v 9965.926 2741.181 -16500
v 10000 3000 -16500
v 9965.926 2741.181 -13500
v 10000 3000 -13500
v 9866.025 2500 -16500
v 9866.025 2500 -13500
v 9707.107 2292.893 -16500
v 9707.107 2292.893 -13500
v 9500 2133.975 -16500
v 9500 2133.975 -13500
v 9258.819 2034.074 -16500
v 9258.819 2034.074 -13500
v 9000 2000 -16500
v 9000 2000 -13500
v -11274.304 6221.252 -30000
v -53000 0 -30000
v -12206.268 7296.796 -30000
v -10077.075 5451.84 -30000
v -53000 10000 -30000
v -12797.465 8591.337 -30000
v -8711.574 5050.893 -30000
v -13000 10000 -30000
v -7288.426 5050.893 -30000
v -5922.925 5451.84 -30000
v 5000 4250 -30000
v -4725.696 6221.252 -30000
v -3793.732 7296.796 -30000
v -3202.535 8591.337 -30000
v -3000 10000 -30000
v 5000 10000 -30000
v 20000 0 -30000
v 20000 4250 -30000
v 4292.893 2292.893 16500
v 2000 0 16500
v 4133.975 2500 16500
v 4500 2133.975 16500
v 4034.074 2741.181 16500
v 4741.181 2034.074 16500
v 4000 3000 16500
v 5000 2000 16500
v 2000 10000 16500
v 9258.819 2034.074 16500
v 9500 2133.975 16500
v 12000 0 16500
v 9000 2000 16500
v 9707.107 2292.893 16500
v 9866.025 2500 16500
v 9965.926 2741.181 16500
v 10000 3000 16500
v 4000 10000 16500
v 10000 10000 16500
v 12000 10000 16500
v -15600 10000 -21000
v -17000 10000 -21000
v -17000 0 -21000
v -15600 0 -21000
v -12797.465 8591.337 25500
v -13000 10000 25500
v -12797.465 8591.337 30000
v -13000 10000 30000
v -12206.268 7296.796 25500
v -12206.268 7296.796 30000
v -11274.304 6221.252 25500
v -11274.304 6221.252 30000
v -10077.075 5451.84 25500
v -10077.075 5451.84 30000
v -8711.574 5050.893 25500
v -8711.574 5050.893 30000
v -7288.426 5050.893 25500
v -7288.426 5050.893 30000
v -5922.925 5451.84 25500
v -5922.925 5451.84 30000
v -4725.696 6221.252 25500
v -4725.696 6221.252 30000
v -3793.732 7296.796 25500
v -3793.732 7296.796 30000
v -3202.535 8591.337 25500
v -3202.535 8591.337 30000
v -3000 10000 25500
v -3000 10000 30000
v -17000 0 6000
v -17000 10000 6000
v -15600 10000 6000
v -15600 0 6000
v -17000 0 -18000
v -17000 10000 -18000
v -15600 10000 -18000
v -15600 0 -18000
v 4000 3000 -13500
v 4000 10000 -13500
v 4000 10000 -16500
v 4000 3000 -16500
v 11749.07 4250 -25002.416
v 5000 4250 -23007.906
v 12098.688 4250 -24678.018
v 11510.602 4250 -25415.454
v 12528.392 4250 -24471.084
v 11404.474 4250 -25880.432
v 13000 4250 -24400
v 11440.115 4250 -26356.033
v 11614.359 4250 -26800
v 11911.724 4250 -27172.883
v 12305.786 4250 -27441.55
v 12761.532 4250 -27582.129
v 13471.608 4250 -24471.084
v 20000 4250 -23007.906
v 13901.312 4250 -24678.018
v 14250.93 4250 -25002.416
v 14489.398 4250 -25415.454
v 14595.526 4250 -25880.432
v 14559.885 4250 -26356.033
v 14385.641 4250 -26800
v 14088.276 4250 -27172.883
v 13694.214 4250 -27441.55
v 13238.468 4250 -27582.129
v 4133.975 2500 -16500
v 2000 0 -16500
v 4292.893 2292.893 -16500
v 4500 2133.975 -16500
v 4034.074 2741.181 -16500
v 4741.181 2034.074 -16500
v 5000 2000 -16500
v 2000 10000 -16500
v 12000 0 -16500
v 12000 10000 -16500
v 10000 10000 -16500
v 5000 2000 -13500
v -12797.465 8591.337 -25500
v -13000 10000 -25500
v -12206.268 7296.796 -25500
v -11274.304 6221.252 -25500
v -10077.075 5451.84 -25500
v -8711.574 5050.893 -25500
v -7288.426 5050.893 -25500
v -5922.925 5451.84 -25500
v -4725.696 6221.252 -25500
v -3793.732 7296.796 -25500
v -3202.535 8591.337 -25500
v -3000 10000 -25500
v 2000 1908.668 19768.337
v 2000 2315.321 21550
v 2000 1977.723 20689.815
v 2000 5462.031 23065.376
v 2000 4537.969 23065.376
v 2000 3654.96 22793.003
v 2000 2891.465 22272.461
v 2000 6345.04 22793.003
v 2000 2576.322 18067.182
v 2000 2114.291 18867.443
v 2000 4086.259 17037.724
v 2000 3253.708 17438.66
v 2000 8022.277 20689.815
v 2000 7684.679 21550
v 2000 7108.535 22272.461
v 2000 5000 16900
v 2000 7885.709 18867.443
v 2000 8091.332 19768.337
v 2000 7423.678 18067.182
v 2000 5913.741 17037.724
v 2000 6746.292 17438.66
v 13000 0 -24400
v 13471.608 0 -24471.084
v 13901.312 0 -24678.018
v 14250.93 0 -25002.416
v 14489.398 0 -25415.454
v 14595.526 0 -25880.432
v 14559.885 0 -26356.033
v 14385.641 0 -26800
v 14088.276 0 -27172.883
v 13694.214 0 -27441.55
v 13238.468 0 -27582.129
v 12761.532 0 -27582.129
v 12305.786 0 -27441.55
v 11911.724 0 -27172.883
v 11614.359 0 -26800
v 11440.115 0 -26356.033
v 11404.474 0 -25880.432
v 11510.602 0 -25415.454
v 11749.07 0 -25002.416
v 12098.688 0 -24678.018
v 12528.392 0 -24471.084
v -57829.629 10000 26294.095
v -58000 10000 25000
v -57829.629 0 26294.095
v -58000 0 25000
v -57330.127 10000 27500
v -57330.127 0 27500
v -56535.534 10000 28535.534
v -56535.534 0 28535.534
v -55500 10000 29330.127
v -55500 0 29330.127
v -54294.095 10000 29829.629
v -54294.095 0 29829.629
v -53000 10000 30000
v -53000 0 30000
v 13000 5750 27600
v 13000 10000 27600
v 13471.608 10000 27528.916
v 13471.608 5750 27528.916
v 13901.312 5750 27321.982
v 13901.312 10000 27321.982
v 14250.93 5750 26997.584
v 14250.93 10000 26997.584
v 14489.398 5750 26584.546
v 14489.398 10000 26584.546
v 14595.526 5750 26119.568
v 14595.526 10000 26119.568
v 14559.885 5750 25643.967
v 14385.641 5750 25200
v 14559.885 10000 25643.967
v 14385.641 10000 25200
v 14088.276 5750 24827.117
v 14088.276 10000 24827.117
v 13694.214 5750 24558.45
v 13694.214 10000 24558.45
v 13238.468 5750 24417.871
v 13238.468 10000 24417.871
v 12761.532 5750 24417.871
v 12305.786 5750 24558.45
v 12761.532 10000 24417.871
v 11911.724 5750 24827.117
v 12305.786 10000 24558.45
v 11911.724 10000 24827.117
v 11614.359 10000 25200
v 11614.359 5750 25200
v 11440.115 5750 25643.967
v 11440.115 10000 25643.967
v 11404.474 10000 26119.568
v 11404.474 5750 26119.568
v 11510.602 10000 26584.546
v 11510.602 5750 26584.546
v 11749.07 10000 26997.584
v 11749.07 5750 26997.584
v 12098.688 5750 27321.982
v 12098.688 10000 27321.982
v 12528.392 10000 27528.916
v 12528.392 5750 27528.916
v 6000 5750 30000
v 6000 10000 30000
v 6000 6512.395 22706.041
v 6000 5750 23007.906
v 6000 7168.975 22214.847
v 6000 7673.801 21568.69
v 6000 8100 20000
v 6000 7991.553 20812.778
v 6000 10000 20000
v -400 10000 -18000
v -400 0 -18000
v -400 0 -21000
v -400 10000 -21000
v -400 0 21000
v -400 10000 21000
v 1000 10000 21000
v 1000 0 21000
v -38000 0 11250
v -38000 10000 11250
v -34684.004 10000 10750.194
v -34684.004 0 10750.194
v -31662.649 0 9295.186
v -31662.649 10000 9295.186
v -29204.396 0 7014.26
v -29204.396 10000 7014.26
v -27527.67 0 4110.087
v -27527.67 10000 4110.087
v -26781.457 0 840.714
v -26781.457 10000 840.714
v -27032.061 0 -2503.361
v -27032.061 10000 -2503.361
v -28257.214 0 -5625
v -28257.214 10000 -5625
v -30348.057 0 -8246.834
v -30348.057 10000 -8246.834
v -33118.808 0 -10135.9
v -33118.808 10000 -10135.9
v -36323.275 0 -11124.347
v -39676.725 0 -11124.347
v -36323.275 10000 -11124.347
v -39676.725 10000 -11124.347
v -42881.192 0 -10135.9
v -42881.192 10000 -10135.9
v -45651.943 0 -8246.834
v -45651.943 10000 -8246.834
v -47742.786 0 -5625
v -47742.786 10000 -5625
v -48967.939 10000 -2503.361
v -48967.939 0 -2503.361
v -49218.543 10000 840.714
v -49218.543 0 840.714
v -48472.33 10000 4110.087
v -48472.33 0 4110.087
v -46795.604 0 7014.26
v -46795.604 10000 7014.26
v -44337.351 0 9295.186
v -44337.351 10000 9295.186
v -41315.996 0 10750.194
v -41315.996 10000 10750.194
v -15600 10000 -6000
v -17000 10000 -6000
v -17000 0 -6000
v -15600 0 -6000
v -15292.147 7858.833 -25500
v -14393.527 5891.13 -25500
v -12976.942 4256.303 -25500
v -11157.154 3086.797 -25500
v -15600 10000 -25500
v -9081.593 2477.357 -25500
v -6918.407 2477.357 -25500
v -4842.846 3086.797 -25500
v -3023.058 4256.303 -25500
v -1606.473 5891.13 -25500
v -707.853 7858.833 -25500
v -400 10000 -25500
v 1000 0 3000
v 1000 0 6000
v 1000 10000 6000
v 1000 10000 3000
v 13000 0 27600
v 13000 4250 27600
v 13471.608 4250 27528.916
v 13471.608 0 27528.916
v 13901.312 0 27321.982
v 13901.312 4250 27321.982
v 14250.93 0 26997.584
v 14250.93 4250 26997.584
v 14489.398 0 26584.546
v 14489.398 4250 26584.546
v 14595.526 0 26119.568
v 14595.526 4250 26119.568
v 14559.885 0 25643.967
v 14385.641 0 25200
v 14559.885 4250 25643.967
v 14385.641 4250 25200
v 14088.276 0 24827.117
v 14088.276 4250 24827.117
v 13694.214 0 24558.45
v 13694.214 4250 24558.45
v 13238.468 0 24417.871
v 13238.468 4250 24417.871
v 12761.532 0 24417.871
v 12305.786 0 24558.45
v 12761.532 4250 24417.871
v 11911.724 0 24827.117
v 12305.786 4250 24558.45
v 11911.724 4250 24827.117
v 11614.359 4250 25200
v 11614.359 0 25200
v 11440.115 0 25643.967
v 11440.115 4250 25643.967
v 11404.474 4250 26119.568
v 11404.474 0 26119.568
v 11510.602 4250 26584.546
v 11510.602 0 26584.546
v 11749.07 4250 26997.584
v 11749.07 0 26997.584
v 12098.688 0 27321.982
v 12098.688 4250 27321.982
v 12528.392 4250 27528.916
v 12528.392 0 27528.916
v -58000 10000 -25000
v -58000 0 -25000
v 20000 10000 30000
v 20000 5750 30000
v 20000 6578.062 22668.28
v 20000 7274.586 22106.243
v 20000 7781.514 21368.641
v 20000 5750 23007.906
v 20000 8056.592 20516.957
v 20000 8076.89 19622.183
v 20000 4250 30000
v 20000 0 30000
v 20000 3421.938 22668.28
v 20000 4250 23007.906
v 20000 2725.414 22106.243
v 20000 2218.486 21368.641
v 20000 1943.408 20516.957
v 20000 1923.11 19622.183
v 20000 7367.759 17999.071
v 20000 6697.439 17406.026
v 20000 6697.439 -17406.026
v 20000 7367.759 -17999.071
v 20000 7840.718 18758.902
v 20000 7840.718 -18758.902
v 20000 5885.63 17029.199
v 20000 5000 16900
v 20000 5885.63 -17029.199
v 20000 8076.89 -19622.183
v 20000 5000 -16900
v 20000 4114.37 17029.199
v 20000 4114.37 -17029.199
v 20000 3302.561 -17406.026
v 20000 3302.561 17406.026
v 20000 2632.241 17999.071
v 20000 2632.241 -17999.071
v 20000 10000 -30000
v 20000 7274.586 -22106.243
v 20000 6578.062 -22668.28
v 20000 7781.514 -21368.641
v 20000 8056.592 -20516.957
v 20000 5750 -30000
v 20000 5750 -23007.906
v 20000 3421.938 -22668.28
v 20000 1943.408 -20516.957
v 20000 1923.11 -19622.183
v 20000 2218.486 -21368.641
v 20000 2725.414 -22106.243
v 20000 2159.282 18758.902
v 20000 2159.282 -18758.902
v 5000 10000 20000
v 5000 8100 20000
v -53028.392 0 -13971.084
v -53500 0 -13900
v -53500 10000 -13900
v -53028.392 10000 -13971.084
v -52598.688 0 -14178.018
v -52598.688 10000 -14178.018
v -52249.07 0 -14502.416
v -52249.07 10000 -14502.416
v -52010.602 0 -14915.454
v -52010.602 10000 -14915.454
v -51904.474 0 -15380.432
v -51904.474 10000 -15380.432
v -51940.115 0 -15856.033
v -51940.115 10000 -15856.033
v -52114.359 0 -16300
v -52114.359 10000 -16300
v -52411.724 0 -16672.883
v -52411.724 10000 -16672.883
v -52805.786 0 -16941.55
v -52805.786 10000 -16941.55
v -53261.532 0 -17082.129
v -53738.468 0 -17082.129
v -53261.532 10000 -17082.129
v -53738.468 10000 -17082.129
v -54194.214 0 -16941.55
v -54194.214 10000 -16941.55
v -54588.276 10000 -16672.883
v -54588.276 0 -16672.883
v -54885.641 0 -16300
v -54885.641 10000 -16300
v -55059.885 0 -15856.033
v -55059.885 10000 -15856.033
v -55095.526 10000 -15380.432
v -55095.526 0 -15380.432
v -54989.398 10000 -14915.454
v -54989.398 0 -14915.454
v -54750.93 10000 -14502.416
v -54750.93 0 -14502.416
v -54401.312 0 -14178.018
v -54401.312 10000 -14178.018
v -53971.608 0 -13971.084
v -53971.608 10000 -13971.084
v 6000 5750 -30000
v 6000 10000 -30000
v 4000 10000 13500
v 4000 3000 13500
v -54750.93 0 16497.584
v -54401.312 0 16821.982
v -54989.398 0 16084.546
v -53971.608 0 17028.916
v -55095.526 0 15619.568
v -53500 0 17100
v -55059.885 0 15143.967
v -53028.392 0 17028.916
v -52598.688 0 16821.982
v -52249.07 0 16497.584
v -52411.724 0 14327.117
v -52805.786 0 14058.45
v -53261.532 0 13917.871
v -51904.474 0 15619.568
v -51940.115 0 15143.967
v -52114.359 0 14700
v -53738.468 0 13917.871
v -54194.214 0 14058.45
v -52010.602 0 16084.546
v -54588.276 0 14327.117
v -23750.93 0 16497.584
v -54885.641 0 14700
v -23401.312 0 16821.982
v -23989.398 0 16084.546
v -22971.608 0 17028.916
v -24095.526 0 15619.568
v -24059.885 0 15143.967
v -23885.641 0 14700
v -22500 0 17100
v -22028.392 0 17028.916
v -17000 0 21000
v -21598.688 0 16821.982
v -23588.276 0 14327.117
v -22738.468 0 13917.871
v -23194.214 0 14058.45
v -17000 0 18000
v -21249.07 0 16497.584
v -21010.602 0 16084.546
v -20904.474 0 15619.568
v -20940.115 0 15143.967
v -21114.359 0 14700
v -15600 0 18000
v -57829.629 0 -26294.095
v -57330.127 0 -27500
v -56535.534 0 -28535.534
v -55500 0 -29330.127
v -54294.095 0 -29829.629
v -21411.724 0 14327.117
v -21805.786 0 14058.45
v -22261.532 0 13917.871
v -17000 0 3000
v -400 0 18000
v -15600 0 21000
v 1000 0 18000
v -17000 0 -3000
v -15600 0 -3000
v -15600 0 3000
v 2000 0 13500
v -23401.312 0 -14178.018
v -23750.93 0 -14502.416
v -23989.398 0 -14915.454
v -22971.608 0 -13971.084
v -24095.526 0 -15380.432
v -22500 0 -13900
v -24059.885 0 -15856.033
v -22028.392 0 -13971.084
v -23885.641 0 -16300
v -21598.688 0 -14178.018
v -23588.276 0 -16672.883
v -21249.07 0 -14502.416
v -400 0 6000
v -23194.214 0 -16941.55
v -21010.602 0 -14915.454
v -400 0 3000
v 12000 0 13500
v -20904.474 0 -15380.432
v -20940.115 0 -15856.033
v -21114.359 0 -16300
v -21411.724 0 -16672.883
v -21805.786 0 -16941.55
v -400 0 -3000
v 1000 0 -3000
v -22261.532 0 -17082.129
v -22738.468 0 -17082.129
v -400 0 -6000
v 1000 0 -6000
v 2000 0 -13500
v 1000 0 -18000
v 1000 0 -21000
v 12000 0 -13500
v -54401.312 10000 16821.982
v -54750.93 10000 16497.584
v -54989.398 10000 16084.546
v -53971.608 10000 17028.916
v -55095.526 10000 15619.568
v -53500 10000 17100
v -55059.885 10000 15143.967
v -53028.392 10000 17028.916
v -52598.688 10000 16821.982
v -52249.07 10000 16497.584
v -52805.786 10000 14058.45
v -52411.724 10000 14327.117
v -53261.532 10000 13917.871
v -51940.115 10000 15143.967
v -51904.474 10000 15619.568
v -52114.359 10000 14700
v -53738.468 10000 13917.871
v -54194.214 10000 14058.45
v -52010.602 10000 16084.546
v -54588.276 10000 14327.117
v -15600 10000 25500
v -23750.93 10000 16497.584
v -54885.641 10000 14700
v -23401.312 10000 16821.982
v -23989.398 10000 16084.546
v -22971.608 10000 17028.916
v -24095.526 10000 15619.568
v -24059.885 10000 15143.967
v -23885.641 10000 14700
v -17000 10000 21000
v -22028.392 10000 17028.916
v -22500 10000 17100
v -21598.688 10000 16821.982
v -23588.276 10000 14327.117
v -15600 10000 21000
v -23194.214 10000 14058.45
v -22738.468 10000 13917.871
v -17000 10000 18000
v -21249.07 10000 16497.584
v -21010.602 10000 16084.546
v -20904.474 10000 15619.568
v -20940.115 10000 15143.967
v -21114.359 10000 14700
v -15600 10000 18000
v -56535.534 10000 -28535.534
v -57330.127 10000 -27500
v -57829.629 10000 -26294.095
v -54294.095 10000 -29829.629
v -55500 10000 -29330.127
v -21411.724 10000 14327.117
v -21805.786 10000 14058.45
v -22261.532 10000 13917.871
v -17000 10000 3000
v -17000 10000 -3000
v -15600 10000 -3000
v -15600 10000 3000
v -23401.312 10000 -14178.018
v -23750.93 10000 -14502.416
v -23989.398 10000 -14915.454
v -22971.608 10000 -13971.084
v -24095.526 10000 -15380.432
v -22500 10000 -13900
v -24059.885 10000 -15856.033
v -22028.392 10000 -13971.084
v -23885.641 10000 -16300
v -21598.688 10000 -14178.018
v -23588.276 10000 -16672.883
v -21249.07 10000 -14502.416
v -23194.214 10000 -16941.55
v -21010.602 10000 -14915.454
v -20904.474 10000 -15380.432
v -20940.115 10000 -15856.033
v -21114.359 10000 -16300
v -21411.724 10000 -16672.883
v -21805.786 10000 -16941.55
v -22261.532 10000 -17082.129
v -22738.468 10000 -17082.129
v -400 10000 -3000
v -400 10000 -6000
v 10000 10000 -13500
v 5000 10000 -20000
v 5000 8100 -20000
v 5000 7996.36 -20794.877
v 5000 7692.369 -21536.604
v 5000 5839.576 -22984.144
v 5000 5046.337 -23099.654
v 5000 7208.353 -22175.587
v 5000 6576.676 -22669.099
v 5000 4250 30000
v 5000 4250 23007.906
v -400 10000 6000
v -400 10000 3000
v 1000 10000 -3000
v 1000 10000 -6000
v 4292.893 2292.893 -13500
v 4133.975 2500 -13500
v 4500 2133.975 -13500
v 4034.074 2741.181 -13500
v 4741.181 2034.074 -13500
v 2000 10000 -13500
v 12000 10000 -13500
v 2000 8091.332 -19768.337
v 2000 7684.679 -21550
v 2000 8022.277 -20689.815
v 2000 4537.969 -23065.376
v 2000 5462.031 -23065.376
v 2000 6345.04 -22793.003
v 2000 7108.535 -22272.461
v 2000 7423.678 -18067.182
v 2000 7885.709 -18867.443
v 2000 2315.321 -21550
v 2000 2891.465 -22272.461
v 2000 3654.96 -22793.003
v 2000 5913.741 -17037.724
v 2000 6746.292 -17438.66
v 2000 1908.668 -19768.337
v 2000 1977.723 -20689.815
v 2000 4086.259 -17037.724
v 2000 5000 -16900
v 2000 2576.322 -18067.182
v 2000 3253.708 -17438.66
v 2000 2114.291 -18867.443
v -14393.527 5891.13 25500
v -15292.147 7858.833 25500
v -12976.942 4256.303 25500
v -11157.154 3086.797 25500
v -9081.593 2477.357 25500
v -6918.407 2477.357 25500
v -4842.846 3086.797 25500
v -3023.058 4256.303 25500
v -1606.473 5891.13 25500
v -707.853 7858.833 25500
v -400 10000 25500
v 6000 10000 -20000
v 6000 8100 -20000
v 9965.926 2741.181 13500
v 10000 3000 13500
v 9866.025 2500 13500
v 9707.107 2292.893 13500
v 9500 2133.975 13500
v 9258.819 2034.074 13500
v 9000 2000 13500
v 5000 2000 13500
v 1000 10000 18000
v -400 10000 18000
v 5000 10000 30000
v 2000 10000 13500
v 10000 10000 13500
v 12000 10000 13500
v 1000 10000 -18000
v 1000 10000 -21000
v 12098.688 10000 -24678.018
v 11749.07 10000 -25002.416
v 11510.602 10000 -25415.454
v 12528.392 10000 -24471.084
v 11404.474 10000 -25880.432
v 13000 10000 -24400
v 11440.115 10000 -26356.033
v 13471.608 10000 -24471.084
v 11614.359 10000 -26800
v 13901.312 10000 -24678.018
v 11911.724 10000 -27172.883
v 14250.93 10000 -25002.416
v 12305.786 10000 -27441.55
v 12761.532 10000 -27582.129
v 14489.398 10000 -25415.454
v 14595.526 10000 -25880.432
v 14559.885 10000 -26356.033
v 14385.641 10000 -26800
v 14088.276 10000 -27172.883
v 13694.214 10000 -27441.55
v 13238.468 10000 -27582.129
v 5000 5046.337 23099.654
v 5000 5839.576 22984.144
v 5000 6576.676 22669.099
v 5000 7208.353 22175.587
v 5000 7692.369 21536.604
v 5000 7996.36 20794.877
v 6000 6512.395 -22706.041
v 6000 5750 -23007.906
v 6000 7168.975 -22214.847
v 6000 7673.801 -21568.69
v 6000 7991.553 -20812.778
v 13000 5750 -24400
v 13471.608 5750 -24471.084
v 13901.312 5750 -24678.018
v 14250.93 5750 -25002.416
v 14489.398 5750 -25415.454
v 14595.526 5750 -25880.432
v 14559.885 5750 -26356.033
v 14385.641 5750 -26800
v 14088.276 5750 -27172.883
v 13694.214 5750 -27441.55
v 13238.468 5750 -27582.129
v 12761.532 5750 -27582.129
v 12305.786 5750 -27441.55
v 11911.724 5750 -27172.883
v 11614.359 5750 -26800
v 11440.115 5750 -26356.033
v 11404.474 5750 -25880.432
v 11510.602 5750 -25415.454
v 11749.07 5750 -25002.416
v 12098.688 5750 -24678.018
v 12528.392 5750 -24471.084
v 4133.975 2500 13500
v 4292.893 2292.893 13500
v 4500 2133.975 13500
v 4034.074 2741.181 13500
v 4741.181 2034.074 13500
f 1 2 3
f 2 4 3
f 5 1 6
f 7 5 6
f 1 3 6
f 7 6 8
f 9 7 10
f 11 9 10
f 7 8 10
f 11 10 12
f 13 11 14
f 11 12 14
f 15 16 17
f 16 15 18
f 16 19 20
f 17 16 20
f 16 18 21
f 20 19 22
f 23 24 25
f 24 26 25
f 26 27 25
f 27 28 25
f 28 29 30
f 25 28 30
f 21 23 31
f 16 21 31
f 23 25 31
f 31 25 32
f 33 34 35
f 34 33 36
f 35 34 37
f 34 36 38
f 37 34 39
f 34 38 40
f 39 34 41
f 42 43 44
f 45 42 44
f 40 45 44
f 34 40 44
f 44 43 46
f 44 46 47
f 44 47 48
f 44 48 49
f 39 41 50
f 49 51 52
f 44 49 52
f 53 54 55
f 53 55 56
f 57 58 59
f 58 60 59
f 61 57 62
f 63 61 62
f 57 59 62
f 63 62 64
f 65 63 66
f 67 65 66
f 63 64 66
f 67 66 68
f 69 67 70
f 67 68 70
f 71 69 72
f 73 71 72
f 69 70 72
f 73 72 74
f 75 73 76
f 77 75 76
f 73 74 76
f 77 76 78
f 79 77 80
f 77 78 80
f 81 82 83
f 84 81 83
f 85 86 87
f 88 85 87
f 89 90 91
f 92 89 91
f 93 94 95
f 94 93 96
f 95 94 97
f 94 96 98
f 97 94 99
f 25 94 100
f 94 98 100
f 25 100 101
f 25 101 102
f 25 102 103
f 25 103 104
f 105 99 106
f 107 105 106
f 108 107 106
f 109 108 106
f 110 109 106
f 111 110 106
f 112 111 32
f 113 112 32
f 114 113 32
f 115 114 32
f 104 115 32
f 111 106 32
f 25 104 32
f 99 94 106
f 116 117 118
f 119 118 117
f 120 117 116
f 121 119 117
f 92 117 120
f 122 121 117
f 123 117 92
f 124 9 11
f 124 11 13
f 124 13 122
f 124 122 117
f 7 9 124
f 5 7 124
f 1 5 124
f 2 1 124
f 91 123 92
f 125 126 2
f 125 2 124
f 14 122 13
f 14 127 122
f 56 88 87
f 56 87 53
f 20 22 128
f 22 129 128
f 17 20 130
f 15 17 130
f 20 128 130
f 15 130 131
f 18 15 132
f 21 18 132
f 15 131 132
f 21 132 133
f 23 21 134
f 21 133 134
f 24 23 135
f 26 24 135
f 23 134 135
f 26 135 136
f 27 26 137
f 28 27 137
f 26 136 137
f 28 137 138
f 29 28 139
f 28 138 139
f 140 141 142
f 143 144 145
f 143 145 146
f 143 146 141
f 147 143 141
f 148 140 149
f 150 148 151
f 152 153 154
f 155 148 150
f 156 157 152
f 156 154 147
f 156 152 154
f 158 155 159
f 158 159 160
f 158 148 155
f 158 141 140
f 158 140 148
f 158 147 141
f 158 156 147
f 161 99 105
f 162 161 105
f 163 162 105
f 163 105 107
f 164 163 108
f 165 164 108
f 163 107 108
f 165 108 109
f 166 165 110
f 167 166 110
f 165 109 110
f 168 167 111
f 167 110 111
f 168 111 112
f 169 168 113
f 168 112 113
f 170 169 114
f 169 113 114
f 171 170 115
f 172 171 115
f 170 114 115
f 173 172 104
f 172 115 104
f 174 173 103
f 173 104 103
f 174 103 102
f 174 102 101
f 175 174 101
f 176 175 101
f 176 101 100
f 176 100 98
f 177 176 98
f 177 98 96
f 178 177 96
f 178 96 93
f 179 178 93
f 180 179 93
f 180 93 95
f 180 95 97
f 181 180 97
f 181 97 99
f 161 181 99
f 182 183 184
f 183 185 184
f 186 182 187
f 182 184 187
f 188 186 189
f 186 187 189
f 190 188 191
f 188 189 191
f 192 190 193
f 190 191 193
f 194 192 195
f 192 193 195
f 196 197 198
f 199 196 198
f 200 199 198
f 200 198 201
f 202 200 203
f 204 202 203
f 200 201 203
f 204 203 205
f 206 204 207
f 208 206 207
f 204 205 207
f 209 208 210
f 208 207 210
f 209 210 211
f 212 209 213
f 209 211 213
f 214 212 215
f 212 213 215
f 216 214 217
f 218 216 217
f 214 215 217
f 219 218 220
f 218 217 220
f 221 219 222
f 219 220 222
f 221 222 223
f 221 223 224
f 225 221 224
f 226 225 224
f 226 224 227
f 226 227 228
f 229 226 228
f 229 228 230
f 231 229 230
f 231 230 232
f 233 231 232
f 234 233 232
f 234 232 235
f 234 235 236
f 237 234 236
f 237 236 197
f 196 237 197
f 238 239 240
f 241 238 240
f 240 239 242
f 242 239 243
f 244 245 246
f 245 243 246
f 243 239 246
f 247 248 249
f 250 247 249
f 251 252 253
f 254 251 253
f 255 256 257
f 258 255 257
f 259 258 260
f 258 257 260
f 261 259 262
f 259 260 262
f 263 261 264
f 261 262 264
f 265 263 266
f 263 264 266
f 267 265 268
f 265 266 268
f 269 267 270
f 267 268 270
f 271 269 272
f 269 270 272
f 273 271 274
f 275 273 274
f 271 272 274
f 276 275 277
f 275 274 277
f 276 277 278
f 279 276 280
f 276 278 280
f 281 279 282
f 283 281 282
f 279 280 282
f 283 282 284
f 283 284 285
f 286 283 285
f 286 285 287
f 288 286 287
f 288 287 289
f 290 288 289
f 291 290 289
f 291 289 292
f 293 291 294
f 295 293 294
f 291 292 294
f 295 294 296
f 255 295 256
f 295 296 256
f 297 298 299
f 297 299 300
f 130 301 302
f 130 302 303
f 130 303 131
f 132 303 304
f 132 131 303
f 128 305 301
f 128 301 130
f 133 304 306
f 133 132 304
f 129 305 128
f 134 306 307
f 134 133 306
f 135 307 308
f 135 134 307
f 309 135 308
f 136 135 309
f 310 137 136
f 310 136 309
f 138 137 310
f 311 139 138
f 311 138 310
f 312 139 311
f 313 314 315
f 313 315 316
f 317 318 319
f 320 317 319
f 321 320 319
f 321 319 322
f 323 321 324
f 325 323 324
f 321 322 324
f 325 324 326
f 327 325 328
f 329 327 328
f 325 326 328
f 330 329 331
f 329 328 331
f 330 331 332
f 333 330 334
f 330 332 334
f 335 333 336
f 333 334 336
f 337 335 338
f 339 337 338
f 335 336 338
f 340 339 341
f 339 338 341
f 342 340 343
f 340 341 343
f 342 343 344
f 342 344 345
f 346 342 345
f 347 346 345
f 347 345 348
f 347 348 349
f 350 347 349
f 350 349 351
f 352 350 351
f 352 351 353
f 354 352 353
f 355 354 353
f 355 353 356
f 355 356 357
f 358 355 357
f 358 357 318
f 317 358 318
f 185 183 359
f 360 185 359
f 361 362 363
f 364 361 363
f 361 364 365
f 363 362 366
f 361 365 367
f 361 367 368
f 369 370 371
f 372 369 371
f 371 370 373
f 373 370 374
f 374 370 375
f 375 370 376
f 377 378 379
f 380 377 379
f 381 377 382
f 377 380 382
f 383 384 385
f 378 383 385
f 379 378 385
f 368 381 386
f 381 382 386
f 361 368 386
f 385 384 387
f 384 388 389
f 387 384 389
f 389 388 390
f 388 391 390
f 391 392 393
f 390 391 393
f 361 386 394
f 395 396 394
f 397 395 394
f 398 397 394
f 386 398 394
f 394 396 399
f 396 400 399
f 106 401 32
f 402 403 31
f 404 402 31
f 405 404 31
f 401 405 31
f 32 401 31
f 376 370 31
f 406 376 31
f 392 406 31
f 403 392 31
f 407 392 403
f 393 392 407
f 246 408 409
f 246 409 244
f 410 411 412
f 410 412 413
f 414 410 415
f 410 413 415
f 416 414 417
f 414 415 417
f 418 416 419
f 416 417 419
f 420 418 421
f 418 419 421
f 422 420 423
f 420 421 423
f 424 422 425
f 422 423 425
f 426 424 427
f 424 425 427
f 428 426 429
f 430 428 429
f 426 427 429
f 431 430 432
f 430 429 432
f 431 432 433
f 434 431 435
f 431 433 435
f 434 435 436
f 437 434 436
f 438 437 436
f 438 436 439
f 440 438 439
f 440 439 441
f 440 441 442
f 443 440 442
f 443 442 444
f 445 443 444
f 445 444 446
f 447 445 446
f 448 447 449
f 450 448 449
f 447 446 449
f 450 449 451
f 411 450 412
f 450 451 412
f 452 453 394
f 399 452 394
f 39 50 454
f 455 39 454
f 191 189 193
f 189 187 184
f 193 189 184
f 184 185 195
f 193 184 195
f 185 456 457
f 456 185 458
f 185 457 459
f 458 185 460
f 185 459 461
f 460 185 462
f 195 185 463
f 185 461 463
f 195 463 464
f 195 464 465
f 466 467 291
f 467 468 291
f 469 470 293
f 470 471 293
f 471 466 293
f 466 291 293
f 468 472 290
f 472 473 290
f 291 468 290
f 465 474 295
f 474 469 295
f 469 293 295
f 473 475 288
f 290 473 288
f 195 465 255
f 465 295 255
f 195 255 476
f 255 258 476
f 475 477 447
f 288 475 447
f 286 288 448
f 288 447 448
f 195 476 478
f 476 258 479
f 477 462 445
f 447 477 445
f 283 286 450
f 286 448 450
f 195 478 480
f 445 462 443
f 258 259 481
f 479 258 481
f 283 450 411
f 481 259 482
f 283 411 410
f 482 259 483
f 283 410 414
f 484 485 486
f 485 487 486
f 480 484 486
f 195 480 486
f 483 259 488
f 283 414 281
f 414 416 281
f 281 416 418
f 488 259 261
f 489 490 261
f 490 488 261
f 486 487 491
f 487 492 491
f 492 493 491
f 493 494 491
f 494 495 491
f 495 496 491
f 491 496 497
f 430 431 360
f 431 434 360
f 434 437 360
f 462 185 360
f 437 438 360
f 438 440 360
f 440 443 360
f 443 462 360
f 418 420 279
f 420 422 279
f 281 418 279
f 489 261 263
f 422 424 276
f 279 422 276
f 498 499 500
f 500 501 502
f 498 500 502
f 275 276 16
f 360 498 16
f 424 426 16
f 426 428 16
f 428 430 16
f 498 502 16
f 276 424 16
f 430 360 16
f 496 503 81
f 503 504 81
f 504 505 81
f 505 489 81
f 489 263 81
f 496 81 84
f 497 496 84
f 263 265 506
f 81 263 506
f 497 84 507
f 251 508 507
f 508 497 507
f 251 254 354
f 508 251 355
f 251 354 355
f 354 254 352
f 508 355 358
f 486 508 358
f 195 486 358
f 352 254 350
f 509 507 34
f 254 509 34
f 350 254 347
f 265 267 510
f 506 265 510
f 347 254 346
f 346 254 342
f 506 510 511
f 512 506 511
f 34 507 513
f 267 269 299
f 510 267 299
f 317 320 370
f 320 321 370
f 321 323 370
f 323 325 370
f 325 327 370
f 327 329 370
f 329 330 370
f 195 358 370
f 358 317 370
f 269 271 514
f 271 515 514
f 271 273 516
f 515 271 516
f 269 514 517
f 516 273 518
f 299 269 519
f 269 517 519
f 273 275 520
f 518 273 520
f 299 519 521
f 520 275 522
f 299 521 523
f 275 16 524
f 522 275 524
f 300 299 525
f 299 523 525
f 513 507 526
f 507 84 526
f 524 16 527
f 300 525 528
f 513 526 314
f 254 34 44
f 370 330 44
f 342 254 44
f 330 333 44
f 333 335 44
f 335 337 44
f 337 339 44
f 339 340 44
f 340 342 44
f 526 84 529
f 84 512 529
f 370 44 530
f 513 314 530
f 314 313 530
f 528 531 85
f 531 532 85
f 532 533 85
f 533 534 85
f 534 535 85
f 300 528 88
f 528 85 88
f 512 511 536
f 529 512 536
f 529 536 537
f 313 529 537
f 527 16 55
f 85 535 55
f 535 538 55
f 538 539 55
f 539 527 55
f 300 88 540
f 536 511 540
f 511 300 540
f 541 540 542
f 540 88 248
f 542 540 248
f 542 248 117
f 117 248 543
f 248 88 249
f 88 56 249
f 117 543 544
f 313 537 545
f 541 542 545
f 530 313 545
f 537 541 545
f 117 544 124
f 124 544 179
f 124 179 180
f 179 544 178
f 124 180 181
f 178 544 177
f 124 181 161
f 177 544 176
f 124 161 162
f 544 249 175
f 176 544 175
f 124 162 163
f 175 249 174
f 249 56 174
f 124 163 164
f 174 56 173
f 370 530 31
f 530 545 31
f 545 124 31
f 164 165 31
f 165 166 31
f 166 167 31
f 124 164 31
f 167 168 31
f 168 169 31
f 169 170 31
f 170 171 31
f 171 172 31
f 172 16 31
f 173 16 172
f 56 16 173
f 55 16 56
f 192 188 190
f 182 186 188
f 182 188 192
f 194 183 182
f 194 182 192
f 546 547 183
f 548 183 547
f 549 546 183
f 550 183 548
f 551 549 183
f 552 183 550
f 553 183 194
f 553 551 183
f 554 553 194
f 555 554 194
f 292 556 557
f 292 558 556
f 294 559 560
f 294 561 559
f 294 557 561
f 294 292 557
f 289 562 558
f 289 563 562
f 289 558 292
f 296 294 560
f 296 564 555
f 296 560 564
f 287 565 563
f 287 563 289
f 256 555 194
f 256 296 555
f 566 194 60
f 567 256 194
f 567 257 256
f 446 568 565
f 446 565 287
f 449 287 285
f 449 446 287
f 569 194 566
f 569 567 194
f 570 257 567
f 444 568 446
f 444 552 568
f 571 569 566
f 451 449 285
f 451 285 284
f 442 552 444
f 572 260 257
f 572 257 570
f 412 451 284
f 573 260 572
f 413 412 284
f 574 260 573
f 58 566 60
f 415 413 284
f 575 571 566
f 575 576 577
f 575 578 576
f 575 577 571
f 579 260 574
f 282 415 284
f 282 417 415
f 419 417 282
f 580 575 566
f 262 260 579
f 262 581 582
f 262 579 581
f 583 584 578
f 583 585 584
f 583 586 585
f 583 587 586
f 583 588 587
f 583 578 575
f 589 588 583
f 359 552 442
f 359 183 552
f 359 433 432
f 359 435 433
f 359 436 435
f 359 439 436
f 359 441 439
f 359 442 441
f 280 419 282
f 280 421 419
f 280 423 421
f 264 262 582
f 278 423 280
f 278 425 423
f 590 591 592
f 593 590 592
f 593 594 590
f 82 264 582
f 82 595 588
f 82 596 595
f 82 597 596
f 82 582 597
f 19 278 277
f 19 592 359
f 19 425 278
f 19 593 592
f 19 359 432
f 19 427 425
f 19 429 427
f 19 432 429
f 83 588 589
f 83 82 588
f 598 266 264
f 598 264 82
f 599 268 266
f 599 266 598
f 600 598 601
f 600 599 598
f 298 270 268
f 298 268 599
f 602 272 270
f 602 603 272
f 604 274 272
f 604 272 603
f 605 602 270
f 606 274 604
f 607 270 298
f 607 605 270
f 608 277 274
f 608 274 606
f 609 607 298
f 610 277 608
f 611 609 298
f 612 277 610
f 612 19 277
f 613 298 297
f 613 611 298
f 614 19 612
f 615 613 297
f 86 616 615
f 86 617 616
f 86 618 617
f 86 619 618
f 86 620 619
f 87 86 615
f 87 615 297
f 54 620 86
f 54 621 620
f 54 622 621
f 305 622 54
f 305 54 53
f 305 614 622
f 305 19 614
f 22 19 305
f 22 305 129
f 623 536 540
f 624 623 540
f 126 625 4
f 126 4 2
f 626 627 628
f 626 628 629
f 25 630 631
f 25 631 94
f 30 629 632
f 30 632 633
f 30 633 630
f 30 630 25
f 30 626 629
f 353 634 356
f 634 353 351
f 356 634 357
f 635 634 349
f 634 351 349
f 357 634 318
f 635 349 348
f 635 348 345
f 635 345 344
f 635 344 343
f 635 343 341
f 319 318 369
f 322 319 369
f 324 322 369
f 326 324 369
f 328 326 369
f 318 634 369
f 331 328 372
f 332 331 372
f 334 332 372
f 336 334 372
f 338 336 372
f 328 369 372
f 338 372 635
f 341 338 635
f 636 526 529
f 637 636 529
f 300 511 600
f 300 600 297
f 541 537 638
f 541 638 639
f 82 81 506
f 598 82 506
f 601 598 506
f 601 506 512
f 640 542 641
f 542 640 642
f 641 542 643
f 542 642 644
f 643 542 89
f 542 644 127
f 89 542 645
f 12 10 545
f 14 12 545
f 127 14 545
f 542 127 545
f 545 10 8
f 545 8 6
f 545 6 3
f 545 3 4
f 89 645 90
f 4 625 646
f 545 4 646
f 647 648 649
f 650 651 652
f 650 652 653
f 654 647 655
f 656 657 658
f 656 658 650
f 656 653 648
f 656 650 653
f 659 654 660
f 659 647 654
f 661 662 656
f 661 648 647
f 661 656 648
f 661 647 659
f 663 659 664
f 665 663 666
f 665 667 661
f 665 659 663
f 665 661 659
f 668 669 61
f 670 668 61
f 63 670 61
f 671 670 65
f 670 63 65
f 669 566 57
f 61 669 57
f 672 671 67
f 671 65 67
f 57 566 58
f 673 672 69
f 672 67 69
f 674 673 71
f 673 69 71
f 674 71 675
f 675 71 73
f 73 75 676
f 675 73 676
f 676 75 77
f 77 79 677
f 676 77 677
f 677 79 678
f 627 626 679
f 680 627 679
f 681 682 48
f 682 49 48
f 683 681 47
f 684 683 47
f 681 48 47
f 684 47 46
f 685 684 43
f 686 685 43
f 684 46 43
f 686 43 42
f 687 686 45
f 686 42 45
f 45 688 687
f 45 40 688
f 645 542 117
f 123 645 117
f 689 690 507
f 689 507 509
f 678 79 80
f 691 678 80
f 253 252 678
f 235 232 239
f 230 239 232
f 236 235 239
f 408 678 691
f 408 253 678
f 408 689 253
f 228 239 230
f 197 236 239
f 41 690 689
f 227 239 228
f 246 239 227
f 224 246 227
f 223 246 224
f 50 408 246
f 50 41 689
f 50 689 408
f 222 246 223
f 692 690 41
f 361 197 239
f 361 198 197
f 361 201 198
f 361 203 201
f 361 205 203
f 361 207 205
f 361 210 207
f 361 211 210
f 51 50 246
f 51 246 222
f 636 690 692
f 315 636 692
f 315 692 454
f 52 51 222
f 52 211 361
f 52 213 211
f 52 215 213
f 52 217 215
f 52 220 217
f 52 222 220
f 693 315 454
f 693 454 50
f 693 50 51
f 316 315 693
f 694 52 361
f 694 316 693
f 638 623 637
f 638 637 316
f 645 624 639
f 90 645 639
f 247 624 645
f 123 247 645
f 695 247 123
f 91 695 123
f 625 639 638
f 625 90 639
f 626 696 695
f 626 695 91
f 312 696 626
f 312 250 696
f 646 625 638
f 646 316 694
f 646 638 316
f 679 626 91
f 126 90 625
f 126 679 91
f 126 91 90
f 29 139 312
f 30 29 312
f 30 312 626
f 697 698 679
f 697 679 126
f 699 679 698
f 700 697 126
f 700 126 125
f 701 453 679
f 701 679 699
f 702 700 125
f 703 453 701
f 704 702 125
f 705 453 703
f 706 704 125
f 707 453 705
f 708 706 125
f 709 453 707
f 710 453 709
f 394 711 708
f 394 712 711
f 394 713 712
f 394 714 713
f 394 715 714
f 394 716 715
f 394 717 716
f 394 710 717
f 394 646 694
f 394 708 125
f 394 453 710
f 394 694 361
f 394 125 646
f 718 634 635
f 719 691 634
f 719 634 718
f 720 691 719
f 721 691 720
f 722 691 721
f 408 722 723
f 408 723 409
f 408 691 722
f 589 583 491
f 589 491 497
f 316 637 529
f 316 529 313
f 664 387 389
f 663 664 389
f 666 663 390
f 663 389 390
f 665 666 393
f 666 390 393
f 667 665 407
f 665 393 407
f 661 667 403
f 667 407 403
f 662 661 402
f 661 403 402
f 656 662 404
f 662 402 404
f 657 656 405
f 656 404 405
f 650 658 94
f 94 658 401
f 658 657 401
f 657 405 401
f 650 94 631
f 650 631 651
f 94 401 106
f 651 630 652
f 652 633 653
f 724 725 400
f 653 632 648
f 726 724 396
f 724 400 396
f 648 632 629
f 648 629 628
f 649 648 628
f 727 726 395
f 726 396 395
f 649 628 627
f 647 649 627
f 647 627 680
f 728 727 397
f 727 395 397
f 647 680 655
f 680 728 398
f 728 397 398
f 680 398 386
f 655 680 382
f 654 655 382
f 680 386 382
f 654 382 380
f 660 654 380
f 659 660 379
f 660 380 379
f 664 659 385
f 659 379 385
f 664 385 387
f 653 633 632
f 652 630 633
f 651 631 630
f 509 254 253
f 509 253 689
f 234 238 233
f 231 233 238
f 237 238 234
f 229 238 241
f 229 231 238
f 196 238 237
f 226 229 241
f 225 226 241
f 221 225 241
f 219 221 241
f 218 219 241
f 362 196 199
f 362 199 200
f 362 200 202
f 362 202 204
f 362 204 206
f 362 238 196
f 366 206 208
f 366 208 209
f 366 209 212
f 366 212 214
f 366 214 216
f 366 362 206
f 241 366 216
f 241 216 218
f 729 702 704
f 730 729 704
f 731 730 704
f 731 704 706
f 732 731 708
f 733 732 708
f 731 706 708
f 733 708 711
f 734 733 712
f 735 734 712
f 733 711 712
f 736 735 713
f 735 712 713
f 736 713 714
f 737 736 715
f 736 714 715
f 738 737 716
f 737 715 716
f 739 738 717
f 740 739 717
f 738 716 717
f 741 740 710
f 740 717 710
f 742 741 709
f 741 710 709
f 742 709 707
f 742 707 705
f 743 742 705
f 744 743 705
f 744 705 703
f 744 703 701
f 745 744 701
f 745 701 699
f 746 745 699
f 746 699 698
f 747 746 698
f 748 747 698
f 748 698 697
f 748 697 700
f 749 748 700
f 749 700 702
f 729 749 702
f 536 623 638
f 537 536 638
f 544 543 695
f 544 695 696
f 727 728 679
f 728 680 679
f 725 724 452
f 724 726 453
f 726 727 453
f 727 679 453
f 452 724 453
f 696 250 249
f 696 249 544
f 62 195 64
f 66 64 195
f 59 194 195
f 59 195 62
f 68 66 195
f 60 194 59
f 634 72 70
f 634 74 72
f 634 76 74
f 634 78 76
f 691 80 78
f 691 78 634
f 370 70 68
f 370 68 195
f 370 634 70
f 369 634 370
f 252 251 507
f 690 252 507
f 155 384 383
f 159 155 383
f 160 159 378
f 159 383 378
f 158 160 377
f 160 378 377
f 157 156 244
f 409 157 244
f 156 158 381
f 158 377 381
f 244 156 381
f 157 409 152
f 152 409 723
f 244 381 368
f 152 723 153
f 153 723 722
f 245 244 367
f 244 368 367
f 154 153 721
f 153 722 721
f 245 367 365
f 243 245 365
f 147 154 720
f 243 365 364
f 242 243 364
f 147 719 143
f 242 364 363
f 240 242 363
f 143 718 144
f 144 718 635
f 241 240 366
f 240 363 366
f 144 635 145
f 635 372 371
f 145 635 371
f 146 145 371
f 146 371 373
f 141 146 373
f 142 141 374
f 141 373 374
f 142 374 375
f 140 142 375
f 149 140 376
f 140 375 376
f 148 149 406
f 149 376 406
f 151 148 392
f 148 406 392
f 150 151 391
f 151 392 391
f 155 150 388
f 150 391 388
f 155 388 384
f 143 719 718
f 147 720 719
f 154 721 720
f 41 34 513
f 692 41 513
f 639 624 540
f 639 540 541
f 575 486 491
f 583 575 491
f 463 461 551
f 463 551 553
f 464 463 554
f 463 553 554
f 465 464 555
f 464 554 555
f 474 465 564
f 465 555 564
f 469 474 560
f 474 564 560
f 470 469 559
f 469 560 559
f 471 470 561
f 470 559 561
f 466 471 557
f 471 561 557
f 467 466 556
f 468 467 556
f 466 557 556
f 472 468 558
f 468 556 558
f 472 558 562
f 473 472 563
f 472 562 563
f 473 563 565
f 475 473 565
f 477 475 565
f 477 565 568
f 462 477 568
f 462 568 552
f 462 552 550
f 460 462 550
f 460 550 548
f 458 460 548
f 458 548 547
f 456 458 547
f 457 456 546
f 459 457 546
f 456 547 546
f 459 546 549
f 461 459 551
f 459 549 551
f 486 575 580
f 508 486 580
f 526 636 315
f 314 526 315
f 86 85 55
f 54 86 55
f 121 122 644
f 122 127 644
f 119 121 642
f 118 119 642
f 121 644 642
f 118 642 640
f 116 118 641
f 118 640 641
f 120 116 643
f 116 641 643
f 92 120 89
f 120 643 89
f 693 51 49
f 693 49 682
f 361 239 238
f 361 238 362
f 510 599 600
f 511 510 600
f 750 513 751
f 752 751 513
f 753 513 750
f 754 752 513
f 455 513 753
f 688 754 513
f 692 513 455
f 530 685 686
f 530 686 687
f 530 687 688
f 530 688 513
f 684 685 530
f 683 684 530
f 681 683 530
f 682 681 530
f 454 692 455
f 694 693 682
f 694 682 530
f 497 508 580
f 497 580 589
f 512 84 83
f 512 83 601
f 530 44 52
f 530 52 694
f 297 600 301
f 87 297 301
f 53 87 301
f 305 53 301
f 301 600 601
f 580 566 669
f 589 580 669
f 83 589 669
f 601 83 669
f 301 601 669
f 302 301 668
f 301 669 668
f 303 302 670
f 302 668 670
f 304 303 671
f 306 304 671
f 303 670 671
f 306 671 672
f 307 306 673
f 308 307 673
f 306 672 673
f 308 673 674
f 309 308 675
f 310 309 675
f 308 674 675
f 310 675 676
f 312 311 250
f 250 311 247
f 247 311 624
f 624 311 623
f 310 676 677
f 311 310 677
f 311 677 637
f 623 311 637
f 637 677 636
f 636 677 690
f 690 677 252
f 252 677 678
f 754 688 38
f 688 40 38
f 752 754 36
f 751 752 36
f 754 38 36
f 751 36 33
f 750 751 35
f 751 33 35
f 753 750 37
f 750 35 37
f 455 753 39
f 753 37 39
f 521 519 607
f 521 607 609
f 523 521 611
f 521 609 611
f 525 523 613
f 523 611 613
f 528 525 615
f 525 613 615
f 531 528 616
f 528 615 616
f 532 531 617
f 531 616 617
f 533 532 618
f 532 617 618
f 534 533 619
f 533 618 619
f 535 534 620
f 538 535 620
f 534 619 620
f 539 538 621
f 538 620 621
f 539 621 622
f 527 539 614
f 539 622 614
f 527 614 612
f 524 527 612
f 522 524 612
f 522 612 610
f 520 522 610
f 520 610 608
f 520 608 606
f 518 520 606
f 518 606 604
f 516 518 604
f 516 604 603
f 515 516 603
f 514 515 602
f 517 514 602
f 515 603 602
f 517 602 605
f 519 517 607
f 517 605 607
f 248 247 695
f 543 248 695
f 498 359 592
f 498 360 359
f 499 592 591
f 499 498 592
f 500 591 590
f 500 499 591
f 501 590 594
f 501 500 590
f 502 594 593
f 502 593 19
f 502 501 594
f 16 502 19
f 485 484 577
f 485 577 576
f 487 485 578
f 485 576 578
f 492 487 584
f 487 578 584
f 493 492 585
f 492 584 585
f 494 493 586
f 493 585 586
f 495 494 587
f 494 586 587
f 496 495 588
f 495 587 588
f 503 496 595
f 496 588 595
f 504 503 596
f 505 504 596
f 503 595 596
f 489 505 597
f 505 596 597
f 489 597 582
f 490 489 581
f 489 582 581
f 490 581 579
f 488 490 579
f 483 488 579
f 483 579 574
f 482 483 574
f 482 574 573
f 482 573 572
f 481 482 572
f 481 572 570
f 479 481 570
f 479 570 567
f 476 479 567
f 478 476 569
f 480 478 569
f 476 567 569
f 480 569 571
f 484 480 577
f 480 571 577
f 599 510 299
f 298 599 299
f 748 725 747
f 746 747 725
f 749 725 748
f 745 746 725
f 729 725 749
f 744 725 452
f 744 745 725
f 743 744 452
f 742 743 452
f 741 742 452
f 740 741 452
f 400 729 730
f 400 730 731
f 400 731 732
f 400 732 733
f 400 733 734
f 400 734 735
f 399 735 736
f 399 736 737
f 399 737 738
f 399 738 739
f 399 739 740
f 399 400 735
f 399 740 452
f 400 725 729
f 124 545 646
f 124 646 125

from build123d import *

# Parameters (mm, degrees)
SKETCH_2_W           = 40000
SKETCH_2_H           = 60000
EXTRUDE_1_DEPTH      = 10000
SKETCH_4_R           = 7600
CUT_EXTRUDE_2_DEPTH  = 25500
SKETCH_5_R           = 5000
CUT_EXTRUDE_3_DEPTH  = 40000
SKETCH_6_W           = 2000
SKETCH_6_H           = 3000
CUT_EXTRUDE_4_DEPTH  = 80000
SKETCH_12_W          = 38000
SKETCH_12_H          = 60000
SKETCH_12_R          = 1600
SKETCH_12_R_2        = 11250
EXTRUDE_2_DEPTH      = 10000
SKETCH_13_R          = 3100
CUT_EXTRUDE_6_DEPTH  = 18000
SKETCH_16_W          = 10031.479605139
SKETCH_16_H          = 1500
CUT_EXTRUDE_7_DEPTH  = 15000
CUT_EXTRUDE_8_REACH  = 66062.578
SKETCH_17_W          = 1000
SKETCH_17_H          = 10000
SKETCH_18_R          = 1600
CUT_EXTRUDE_9_DEPTH  = 15000
SKETCH_19_W          = 1400
SKETCH_19_H          = 3000
CUT_EXTRUDE_10_DEPTH = 15000
FILLET_1_R           = 5000
SKETCH_20_W          = 6000
SKETCH_20_H          = 3000
CUT_EXTRUDE_11_DEPTH = 2000
FILLET_2_R           = 1000


with BuildPart() as part:
    # 草圖2 → 填料-伸長1 (new body)
    with BuildSketch(Plane(origin=(0, 0, 0), x_dir=(1, 0, 0), z_dir=(0, 1, 0))):
        Rectangle(SKETCH_2_W, SKETCH_2_H)
    extrude(amount=EXTRUDE_1_DEPTH)

    # 草圖4 → 除料-伸長2 (cut, symmetric)
    with BuildSketch(Plane.XY):
        with Locations((-8000, 10000)):
            Circle(SKETCH_4_R)
    extrude(amount=CUT_EXTRUDE_2_DEPTH, both=True, mode=Mode.SUBTRACT)

    # 草圖5 → 除料-伸長3 (cut, symmetric)
    with BuildSketch(Plane.XY):
        with Locations((-8000, 10000)):
            Circle(SKETCH_5_R)
    extrude(amount=CUT_EXTRUDE_3_DEPTH, both=True, mode=Mode.SUBTRACT)

    # 草圖6 → 除料-伸長4 (cut)
    with BuildSketch(Plane(origin=(0, 10000, 0), x_dir=(1, 0, 0), z_dir=(0, 1, 0))):
        with Locations((11000, -15000)):
            Rectangle(SKETCH_6_W, SKETCH_6_H)
        with Locations((3000, 15000)):
            Rectangle(SKETCH_6_W, SKETCH_6_H)
        with Locations((11000, 15000)):
            Rectangle(SKETCH_6_W, SKETCH_6_H)
        with Locations((3000, -15000)):
            Rectangle(SKETCH_6_W, SKETCH_6_H)
    extrude(amount=-CUT_EXTRUDE_4_DEPTH, mode=Mode.SUBTRACT)

    # 草圖12 → 填料-伸長2 (add)
    with BuildSketch(Plane(origin=(0, 10000, 0), x_dir=(1, 0, 0), z_dir=(0, 1, 0))):
        with Locations((-39000, 0)):
            Rectangle(SKETCH_12_W, SKETCH_12_H)
        with Locations(Location((-53500, 15500, 0), (0, 0, 270))):
            Circle(SKETCH_12_R, mode=Mode.SUBTRACT)
        with Locations(Location((-22500, 15500, 0), (0, 0, 270))):
            Circle(SKETCH_12_R, mode=Mode.SUBTRACT)
        with Locations(Location((-53500, -15500, 0), (0, 0, 270))):
            Circle(SKETCH_12_R, mode=Mode.SUBTRACT)
        with Locations(Location((-22500, -15500, 0), (0, 0, 270))):
            Circle(SKETCH_12_R, mode=Mode.SUBTRACT)
        with Locations(Location((-38000, 0, 0), (0, 0, 270))):
            Circle(SKETCH_12_R_2, mode=Mode.SUBTRACT)
    extrude(amount=-EXTRUDE_2_DEPTH)

    # 草圖13 → 除料-伸長6 (cut)
    with BuildSketch(Plane(origin=(20000, 0, 0), x_dir=(0, 0, -1), z_dir=(1, 0, 0))):
        with Locations((-20000, 5000)):
            Circle(SKETCH_13_R)
        with Locations(Location((20000, 5000, 0), (0, 0, 180))):
            Circle(SKETCH_13_R)
    extrude(amount=-CUT_EXTRUDE_6_DEPTH, mode=Mode.SUBTRACT)

    # 草圖16 → 除料-伸長7 (cut)
    with BuildSketch(Plane(origin=(20000, 0, 0), x_dir=(0, 0, -1), z_dir=(1, 0, 0))):
        with Locations((-26040.217814772, 5000)):
            Rectangle(SKETCH_16_W, SKETCH_16_H)
        with Locations((26040.217814772, 5000)):
            Rectangle(SKETCH_16_W, SKETCH_16_H)
    extrude(amount=-CUT_EXTRUDE_7_DEPTH, mode=Mode.SUBTRACT)

    # 除料-伸長8: up to this face of the body (flat: up to its plane)
    cut_extrude_8_end = Plane(part.part.faces().sort_by_distance((12500, 4250, -26503.95312427))[0])
    # 草圖17 → 除料-伸長8 (cut, up to the picked face)
    with BuildSketch(Plane(origin=(0, 10000, 0), x_dir=(1, 0, 0), z_dir=(0, 1, 0)), mode=Mode.PRIVATE) as cut_extrude_8_sk1:
        with Locations((5500, 25000)):
            Rectangle(SKETCH_17_W, SKETCH_17_H)
    cut_extrude_8_tool1 = split(extrude(cut_extrude_8_sk1.sketch, amount=-CUT_EXTRUDE_8_REACH, mode=Mode.PRIVATE), bisect_by=cut_extrude_8_end, keep=Keep.BOTH, mode=Mode.PRIVATE)
    # 草圖17 → 除料-伸長8 (cut, up to the picked face)
    with BuildSketch(Plane(origin=(0, 10000, 0), x_dir=(1, 0, 0), z_dir=(0, 1, 0)), mode=Mode.PRIVATE) as cut_extrude_8_sk2:
        with Locations((5500, -25000)):
            Rectangle(SKETCH_17_W, SKETCH_17_H)
    cut_extrude_8_tool2 = split(extrude(cut_extrude_8_sk2.sketch, amount=-CUT_EXTRUDE_8_REACH, mode=Mode.PRIVATE), bisect_by=cut_extrude_8_end, keep=Keep.BOTH, mode=Mode.PRIVATE)
    add(cut_extrude_8_tool1.solids().sort_by(Axis((5500, 10000, -25000), (0, -1, 0)))[0], mode=Mode.SUBTRACT)
    add(cut_extrude_8_tool2.solids().sort_by(Axis((5500, 10000, 25000), (0, -1, 0)))[0], mode=Mode.SUBTRACT)

    # 草圖18 → 除料-伸長9 (cut)
    with BuildSketch(Plane(origin=(0, 10000, 0), x_dir=(1, 0, 0), z_dir=(0, 1, 0))):
        with Locations(Location((13000, 26000, 0), (0, 0, 270))):
            Circle(SKETCH_18_R)
        with Locations(Location((13000, -26000, 0), (0, 0, 270))):
            Circle(SKETCH_18_R)
    extrude(amount=-CUT_EXTRUDE_9_DEPTH, mode=Mode.SUBTRACT)

    # 草圖19 → 除料-伸長10 (cut)
    with BuildSketch(Plane(origin=(0, 10000, 0), x_dir=(1, 0, 0), z_dir=(0, 1, 0))):
        with Locations((-16300, 19500)):
            Rectangle(SKETCH_19_W, SKETCH_19_H)
        with Locations((-16300, 4500)):
            Rectangle(SKETCH_19_W, SKETCH_19_H)
        with Locations((-16300, -4500)):
            Rectangle(SKETCH_19_W, SKETCH_19_H)
        with Locations((-16300, -19500)):
            Rectangle(SKETCH_19_W, SKETCH_19_H)
        with Locations((300, -19500)):
            Rectangle(SKETCH_19_W, SKETCH_19_H)
        with Locations((300, -4500)):
            Rectangle(SKETCH_19_W, SKETCH_19_H)
        with Locations((300, 4500)):
            Rectangle(SKETCH_19_W, SKETCH_19_H)
        with Locations((300, 19500)):
            Rectangle(SKETCH_19_W, SKETCH_19_H)
    extrude(amount=-CUT_EXTRUDE_10_DEPTH, mode=Mode.SUBTRACT)

    # 圓角1
    fillet_1_edges = [part.edges().sort_by_distance(p)[0] for p in [
        (-58000, 5000, 30000),
        (-58000, 5000, -30000),
    ]]
    fillet(fillet_1_edges, radius=FILLET_1_R)

    # 草圖20 → 除料-伸長11 (cut)
    with BuildSketch(Plane.XZ):
        with Locations((7000, 15000)):
            Rectangle(SKETCH_20_W, SKETCH_20_H)
        with Locations((7000, -15000)):
            Rectangle(SKETCH_20_W, SKETCH_20_H)
    extrude(amount=-CUT_EXTRUDE_11_DEPTH, mode=Mode.SUBTRACT)

    # 圓角2
    fillet_2_edges = [part.edges().sort_by_distance(p)[0] for p in [
        (4000, 2000, 15000),
        (10000, 2000, 15000),
        (4000, 2000, -15000),
        (10000, 2000, -15000),
    ]]
    fillet(fillet_2_edges, radius=FILLET_2_R)


solid = part.part
